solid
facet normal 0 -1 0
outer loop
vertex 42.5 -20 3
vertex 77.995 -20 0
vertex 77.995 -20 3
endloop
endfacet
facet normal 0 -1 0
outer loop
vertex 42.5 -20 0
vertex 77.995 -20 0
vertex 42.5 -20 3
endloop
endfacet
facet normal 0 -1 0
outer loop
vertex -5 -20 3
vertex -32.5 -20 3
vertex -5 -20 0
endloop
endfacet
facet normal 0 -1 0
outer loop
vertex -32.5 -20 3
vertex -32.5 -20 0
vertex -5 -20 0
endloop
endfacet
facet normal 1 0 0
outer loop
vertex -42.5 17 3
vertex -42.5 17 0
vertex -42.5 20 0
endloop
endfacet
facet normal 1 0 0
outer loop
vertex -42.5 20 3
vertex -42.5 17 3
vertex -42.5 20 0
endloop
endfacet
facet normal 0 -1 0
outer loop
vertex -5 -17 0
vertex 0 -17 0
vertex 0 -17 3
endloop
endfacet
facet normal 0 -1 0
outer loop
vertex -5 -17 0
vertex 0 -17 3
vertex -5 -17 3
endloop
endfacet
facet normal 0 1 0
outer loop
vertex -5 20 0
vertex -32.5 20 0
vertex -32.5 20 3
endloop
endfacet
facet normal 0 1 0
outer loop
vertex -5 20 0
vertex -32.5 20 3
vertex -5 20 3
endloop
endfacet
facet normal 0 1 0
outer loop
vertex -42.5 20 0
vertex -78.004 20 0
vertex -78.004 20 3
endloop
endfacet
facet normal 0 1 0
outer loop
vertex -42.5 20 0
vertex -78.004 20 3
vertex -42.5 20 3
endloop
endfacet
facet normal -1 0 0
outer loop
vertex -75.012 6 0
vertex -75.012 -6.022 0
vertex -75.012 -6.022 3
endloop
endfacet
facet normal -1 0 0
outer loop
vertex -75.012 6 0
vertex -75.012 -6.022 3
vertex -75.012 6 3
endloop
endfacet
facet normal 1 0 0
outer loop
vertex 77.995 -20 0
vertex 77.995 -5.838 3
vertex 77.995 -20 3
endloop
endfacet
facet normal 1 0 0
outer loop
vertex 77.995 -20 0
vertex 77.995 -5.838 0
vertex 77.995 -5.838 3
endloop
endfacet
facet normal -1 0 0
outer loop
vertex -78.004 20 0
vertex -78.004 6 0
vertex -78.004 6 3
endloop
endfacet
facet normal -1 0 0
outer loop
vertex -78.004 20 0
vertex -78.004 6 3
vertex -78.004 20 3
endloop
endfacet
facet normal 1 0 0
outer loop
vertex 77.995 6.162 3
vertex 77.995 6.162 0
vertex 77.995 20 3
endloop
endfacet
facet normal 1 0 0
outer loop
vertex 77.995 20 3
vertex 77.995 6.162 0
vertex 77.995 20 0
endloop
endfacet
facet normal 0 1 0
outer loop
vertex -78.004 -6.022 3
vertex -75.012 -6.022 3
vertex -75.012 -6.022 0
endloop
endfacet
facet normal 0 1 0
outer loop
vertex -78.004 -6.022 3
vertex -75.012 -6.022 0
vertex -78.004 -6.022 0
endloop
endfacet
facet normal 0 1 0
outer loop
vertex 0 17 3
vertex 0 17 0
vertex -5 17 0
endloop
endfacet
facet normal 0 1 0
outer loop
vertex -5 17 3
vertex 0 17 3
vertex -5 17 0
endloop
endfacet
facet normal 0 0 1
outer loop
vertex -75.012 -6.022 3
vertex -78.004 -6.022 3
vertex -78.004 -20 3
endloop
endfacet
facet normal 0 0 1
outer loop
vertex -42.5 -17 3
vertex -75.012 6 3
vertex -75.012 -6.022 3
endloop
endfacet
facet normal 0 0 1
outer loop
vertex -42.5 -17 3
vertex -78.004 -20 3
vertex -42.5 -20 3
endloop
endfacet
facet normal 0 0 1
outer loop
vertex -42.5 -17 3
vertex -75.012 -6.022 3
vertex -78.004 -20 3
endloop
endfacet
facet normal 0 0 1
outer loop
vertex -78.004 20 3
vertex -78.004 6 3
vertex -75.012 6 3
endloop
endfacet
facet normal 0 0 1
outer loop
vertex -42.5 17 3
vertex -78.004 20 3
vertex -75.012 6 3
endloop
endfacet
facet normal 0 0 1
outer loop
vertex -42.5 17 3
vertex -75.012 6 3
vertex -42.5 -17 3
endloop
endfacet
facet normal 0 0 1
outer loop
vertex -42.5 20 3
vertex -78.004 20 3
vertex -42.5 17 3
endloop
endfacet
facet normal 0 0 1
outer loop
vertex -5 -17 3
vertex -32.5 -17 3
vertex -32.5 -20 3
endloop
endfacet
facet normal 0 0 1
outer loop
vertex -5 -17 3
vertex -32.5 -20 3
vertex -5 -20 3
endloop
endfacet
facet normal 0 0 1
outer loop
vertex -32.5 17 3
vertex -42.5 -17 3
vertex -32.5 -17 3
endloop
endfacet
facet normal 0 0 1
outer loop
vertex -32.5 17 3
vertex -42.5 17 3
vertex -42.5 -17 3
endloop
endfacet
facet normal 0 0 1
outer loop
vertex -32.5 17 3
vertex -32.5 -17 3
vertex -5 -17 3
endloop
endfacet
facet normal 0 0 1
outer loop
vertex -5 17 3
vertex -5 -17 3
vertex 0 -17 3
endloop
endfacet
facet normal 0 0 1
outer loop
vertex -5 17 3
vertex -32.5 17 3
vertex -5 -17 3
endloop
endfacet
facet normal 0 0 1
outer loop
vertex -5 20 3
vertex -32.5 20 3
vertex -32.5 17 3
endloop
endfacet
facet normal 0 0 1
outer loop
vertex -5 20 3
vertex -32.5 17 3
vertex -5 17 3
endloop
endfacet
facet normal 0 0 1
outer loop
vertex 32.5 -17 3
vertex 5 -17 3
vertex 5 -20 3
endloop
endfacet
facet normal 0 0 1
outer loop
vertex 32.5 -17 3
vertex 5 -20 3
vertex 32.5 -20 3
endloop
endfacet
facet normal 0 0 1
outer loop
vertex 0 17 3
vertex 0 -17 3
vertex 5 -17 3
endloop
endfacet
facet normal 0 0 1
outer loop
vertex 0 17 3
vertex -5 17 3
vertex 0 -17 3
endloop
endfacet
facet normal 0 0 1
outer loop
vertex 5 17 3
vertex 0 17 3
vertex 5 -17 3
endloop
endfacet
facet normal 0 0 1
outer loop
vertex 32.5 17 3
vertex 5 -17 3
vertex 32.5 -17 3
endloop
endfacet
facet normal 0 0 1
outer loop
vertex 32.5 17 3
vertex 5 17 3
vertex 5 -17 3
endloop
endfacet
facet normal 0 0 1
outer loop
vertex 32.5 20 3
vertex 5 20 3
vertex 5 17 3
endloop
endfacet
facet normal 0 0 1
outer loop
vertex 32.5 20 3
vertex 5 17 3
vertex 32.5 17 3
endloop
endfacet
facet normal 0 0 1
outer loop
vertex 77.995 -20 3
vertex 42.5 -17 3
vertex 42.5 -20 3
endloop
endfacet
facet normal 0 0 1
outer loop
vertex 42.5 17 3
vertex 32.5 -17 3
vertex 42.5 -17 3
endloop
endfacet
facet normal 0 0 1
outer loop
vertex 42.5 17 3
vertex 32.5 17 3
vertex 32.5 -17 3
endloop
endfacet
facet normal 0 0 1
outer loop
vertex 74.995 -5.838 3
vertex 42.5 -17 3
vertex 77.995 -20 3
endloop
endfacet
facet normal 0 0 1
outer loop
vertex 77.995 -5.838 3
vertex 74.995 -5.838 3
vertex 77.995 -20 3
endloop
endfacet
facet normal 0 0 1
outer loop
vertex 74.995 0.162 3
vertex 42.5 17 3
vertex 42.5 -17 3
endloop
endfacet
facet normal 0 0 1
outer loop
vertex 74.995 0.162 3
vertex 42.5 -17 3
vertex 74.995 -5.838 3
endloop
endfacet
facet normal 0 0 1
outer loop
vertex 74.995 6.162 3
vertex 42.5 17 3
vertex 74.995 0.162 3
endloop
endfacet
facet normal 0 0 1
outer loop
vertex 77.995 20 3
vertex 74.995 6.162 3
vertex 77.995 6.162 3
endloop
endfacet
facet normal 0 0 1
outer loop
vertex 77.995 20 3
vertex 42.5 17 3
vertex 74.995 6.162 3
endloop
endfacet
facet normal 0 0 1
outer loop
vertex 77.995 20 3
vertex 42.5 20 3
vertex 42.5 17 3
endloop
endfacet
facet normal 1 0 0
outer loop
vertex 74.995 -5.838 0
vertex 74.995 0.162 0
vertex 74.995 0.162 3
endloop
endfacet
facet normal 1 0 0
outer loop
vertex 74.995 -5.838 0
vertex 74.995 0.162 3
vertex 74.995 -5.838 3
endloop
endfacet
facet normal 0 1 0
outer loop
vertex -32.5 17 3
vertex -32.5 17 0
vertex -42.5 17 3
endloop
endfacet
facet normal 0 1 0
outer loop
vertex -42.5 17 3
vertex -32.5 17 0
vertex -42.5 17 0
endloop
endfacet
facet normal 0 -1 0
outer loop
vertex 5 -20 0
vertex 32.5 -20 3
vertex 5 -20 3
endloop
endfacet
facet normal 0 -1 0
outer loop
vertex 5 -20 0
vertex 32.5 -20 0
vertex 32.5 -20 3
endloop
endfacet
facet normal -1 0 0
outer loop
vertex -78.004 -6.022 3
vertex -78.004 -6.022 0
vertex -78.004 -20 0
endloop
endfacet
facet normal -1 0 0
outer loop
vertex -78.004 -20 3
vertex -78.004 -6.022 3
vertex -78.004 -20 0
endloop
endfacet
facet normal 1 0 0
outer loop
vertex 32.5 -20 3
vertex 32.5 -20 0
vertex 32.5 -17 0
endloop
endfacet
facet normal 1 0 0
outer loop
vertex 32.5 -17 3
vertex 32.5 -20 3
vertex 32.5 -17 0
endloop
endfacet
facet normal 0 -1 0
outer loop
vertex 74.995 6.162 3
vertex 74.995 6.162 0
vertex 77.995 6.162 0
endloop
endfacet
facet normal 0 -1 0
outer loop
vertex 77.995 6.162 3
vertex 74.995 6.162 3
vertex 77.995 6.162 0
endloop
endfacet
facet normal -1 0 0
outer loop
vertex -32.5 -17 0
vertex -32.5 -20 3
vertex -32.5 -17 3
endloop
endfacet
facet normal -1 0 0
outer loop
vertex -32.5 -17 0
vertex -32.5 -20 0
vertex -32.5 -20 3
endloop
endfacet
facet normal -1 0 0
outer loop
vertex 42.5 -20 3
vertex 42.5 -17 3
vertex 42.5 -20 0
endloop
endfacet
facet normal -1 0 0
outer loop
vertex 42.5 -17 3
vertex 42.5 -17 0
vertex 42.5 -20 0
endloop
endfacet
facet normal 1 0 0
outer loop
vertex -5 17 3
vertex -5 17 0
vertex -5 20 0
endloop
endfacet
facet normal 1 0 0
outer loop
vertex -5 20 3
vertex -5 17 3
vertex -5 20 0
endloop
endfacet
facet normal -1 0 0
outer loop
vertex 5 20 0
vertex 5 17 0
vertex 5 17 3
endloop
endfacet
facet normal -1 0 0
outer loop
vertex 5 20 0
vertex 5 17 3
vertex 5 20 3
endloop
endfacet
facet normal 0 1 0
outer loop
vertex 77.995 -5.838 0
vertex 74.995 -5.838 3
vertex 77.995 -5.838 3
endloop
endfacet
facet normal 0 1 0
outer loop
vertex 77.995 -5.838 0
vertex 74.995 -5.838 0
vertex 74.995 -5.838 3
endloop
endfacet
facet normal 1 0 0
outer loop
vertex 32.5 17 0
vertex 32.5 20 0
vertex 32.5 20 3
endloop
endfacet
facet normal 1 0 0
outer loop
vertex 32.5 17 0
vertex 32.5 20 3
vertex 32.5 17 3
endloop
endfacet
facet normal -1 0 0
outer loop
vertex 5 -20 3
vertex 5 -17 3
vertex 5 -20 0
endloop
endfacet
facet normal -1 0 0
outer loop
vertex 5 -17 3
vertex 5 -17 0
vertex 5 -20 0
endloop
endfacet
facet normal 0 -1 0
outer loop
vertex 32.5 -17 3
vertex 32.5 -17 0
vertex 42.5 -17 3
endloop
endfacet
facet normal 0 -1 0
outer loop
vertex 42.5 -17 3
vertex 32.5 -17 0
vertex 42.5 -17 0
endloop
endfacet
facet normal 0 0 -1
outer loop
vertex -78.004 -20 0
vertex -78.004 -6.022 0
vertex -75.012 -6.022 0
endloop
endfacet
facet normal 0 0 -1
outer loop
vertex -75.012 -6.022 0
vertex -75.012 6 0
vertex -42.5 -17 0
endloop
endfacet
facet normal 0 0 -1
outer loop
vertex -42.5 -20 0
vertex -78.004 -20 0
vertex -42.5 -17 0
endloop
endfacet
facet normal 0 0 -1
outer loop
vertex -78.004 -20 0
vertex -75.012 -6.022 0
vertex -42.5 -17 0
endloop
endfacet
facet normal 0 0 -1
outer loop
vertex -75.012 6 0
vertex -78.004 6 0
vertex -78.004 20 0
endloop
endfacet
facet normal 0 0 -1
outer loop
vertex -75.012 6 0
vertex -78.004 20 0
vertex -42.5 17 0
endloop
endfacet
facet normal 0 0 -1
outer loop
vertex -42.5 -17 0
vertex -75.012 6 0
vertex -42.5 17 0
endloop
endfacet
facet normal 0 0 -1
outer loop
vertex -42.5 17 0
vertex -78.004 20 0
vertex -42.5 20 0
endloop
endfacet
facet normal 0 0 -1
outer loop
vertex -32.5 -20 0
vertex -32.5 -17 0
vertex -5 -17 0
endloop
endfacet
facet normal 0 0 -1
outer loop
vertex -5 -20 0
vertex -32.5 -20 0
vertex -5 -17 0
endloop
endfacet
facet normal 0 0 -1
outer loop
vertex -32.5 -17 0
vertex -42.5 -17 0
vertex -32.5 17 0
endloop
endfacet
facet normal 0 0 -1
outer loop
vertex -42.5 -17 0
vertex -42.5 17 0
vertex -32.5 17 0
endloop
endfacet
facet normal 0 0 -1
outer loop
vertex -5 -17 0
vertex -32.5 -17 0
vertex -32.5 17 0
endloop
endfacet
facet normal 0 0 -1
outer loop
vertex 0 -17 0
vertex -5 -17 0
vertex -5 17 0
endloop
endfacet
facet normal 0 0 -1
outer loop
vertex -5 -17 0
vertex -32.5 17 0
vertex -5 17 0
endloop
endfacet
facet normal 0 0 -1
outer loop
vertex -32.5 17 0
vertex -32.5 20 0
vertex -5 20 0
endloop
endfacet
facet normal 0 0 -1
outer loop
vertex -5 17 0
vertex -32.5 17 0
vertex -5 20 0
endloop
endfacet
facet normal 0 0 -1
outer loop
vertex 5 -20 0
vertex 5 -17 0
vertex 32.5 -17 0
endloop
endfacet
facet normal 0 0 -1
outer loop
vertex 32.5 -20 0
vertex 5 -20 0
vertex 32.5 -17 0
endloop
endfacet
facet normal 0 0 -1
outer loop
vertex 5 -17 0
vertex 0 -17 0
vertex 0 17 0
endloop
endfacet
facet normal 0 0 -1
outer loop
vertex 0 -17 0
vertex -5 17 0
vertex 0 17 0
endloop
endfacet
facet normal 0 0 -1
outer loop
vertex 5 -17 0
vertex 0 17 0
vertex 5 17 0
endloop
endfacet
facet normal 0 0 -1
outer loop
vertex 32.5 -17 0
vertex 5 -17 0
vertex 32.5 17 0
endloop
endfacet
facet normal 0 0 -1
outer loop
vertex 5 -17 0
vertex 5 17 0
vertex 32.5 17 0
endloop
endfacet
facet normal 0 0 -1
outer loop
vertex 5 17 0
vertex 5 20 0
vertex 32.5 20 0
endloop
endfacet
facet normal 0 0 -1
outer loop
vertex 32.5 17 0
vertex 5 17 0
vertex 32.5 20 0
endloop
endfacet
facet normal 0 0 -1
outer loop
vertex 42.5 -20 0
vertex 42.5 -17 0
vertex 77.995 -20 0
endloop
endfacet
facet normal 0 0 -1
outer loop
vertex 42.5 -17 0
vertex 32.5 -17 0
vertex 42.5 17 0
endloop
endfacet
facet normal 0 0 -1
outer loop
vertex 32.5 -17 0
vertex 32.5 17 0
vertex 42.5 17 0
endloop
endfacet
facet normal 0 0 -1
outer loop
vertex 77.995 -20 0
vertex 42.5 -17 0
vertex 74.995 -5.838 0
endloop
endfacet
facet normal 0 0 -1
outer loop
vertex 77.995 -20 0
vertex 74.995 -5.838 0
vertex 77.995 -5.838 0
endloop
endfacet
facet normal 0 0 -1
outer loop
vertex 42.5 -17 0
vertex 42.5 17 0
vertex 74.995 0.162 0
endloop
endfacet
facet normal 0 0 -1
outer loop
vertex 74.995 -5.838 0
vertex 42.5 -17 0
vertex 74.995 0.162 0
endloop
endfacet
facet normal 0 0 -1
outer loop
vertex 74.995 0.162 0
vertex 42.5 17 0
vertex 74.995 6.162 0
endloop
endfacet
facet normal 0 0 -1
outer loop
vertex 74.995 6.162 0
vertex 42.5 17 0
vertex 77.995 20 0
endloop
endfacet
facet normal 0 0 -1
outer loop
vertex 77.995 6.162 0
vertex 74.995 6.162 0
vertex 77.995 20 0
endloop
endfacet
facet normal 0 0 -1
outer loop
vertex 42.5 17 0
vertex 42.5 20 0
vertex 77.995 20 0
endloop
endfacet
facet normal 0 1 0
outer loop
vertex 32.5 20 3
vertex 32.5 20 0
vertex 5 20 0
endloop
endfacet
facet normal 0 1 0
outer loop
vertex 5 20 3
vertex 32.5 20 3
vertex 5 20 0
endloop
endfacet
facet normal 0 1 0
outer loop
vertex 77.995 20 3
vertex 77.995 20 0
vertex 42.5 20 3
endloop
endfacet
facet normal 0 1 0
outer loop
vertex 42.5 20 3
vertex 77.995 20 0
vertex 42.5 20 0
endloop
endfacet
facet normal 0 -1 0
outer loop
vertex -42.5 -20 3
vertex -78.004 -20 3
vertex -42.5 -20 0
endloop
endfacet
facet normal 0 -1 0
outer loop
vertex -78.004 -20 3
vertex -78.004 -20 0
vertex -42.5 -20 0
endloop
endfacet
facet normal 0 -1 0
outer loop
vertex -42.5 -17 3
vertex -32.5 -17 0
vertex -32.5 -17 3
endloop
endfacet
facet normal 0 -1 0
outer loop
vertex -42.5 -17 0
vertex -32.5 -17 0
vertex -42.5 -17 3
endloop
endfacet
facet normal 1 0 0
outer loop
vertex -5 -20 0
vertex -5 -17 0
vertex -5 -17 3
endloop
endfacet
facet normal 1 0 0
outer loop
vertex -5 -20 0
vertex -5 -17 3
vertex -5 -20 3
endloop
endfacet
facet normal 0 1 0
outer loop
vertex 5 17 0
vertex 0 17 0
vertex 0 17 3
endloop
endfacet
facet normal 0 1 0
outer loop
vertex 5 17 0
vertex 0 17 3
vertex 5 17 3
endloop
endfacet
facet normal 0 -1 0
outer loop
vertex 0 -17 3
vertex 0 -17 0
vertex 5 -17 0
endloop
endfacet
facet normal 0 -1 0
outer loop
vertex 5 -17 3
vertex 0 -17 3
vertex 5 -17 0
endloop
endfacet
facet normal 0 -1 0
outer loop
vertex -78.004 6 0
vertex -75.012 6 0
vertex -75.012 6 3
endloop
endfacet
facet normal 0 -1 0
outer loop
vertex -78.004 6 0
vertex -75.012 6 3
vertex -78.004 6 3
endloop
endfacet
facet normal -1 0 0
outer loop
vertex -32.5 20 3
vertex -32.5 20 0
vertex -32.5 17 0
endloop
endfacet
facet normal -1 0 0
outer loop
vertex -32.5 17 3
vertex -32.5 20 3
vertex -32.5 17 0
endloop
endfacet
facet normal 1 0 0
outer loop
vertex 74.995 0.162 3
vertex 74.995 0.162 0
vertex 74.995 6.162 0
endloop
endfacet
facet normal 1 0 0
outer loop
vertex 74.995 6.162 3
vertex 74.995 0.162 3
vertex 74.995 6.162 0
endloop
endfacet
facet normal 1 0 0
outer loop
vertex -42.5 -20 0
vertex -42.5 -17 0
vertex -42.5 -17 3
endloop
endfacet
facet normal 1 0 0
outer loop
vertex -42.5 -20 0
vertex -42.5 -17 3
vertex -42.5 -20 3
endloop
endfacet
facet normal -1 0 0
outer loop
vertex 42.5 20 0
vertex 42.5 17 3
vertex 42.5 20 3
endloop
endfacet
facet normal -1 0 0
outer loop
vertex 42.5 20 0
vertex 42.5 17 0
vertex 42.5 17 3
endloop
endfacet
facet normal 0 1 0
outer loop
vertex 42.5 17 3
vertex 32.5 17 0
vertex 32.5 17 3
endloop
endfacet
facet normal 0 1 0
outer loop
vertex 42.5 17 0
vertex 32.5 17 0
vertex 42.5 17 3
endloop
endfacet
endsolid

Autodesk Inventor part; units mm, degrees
ref_plane "YZ Plane" through (0, 0, 0) normal (1, 0, 0) x (0, 1, 0)
ref_plane "XZ Plane" through (0, 0, 0) normal (0, 1, 0) x (-1, 0, 0)
ref_plane "XY Plane" through (0, 0, 0) normal (0, 0, 1) x (1, 0, 0)
sketch "Эскиз1" plane through (0, 0, 0) normal (0, 0, 1) x (1, 0, 0)
  line L0 (-78.0042, 6) -> (-78.0042, 20)
  line L1 (-78.0042, 20) -> (-42.5, 20)
  line L2 (-32.5, 20) -> (-32.5, 17)
  line L3 (-32.5, 17) -> (-42.5, 17)
  line L4 (-42.5, 17) -> (-42.5, 20)
  line L5 (-32.5, 20) -> (-5, 20)
  line L6 (0, 17) -> (-5, 17)
  line L7 (-5, 17) -> (-5, 20)
  line L8 (-75.0118, -6.0217) -> (-75.0118, 6)
  line L9 (-75.0118, 6) -> (-78.0042, 6)
  line L10 (-78.0042, 20) -> (-42.5, 20)
  line L11 (-32.5, 20) -> (-5, 20)
  line L12 (77.9946, 6.1624) -> (77.9946, 20)
  line L13 (77.9946, 20) -> (42.5, 20)
  line L14 (32.5, 20) -> (32.5, 17)
  line L15 (32.5, 17) -> (42.5, 17)
  line L16 (42.5, 17) -> (42.5, 20)
  line L17 (32.5, 20) -> (5, 20)
  line L18 (0, 17) -> (5, 17)
  line L19 (5, 17) -> (5, 20)
  line L20 (74.9946, 0.1624) -> (74.9946, 6.1624)
  line L21 (74.9946, 6.1624) -> (77.9946, 6.1624)
  line L22 (77.9946, 20) -> (42.5, 20)
  line L23 (32.5, 20) -> (5, 20)
  line L24 (-78.0038, -6.0216) -> (-78.0038, -20)
  line L25 (-78.0038, -20) -> (-42.5, -20)
  line L26 (-32.5, -20) -> (-32.5, -17)
  line L27 (-32.5, -17) -> (-42.5, -17)
  line L28 (-42.5, -17) -> (-42.5, -20)
  line L29 (-32.5, -20) -> (-5, -20)
  line L30 (0, -17) -> (-5, -17)
  line L31 (-5, -17) -> (-5, -20)
  line L32 (-75.0118, -6.0217) -> (-75.0118, -6.0216)
  line L33 (-75.0118, -6.0216) -> (-78.0038, -6.0216)
  line L34 (-78.0038, -20) -> (-42.5, -20)
  line L35 (-32.5, -20) -> (-5, -20)
  line L36 (77.9946, -5.8376) -> (77.9946, -20)
  line L37 (77.9946, -20) -> (42.5, -20)
  line L38 (32.5, -20) -> (32.5, -17)
  line L39 (32.5, -17) -> (42.5, -17)
  line L40 (42.5, -17) -> (42.5, -20)
  line L41 (32.5, -20) -> (5, -20)
  line L42 (0, -17) -> (5, -17)
  line L43 (5, -17) -> (5, -20)
  line L44 (74.9946, 0.1624) -> (74.9946, -5.8376)
  line L45 (74.9946, -5.8376) -> (77.9946, -5.8376)
  line L46 (77.9946, -20) -> (42.5, -20)
  line L47 (32.5, -20) -> (5, -20)
  line L48 (-78.0042, 6) -> (-75.0042, 6)
  point P0 (0, 0)
extrude "Выдавливание1" add sketch "Эскиз1" along normal blind 3
properties part number "Стекнка t1"
